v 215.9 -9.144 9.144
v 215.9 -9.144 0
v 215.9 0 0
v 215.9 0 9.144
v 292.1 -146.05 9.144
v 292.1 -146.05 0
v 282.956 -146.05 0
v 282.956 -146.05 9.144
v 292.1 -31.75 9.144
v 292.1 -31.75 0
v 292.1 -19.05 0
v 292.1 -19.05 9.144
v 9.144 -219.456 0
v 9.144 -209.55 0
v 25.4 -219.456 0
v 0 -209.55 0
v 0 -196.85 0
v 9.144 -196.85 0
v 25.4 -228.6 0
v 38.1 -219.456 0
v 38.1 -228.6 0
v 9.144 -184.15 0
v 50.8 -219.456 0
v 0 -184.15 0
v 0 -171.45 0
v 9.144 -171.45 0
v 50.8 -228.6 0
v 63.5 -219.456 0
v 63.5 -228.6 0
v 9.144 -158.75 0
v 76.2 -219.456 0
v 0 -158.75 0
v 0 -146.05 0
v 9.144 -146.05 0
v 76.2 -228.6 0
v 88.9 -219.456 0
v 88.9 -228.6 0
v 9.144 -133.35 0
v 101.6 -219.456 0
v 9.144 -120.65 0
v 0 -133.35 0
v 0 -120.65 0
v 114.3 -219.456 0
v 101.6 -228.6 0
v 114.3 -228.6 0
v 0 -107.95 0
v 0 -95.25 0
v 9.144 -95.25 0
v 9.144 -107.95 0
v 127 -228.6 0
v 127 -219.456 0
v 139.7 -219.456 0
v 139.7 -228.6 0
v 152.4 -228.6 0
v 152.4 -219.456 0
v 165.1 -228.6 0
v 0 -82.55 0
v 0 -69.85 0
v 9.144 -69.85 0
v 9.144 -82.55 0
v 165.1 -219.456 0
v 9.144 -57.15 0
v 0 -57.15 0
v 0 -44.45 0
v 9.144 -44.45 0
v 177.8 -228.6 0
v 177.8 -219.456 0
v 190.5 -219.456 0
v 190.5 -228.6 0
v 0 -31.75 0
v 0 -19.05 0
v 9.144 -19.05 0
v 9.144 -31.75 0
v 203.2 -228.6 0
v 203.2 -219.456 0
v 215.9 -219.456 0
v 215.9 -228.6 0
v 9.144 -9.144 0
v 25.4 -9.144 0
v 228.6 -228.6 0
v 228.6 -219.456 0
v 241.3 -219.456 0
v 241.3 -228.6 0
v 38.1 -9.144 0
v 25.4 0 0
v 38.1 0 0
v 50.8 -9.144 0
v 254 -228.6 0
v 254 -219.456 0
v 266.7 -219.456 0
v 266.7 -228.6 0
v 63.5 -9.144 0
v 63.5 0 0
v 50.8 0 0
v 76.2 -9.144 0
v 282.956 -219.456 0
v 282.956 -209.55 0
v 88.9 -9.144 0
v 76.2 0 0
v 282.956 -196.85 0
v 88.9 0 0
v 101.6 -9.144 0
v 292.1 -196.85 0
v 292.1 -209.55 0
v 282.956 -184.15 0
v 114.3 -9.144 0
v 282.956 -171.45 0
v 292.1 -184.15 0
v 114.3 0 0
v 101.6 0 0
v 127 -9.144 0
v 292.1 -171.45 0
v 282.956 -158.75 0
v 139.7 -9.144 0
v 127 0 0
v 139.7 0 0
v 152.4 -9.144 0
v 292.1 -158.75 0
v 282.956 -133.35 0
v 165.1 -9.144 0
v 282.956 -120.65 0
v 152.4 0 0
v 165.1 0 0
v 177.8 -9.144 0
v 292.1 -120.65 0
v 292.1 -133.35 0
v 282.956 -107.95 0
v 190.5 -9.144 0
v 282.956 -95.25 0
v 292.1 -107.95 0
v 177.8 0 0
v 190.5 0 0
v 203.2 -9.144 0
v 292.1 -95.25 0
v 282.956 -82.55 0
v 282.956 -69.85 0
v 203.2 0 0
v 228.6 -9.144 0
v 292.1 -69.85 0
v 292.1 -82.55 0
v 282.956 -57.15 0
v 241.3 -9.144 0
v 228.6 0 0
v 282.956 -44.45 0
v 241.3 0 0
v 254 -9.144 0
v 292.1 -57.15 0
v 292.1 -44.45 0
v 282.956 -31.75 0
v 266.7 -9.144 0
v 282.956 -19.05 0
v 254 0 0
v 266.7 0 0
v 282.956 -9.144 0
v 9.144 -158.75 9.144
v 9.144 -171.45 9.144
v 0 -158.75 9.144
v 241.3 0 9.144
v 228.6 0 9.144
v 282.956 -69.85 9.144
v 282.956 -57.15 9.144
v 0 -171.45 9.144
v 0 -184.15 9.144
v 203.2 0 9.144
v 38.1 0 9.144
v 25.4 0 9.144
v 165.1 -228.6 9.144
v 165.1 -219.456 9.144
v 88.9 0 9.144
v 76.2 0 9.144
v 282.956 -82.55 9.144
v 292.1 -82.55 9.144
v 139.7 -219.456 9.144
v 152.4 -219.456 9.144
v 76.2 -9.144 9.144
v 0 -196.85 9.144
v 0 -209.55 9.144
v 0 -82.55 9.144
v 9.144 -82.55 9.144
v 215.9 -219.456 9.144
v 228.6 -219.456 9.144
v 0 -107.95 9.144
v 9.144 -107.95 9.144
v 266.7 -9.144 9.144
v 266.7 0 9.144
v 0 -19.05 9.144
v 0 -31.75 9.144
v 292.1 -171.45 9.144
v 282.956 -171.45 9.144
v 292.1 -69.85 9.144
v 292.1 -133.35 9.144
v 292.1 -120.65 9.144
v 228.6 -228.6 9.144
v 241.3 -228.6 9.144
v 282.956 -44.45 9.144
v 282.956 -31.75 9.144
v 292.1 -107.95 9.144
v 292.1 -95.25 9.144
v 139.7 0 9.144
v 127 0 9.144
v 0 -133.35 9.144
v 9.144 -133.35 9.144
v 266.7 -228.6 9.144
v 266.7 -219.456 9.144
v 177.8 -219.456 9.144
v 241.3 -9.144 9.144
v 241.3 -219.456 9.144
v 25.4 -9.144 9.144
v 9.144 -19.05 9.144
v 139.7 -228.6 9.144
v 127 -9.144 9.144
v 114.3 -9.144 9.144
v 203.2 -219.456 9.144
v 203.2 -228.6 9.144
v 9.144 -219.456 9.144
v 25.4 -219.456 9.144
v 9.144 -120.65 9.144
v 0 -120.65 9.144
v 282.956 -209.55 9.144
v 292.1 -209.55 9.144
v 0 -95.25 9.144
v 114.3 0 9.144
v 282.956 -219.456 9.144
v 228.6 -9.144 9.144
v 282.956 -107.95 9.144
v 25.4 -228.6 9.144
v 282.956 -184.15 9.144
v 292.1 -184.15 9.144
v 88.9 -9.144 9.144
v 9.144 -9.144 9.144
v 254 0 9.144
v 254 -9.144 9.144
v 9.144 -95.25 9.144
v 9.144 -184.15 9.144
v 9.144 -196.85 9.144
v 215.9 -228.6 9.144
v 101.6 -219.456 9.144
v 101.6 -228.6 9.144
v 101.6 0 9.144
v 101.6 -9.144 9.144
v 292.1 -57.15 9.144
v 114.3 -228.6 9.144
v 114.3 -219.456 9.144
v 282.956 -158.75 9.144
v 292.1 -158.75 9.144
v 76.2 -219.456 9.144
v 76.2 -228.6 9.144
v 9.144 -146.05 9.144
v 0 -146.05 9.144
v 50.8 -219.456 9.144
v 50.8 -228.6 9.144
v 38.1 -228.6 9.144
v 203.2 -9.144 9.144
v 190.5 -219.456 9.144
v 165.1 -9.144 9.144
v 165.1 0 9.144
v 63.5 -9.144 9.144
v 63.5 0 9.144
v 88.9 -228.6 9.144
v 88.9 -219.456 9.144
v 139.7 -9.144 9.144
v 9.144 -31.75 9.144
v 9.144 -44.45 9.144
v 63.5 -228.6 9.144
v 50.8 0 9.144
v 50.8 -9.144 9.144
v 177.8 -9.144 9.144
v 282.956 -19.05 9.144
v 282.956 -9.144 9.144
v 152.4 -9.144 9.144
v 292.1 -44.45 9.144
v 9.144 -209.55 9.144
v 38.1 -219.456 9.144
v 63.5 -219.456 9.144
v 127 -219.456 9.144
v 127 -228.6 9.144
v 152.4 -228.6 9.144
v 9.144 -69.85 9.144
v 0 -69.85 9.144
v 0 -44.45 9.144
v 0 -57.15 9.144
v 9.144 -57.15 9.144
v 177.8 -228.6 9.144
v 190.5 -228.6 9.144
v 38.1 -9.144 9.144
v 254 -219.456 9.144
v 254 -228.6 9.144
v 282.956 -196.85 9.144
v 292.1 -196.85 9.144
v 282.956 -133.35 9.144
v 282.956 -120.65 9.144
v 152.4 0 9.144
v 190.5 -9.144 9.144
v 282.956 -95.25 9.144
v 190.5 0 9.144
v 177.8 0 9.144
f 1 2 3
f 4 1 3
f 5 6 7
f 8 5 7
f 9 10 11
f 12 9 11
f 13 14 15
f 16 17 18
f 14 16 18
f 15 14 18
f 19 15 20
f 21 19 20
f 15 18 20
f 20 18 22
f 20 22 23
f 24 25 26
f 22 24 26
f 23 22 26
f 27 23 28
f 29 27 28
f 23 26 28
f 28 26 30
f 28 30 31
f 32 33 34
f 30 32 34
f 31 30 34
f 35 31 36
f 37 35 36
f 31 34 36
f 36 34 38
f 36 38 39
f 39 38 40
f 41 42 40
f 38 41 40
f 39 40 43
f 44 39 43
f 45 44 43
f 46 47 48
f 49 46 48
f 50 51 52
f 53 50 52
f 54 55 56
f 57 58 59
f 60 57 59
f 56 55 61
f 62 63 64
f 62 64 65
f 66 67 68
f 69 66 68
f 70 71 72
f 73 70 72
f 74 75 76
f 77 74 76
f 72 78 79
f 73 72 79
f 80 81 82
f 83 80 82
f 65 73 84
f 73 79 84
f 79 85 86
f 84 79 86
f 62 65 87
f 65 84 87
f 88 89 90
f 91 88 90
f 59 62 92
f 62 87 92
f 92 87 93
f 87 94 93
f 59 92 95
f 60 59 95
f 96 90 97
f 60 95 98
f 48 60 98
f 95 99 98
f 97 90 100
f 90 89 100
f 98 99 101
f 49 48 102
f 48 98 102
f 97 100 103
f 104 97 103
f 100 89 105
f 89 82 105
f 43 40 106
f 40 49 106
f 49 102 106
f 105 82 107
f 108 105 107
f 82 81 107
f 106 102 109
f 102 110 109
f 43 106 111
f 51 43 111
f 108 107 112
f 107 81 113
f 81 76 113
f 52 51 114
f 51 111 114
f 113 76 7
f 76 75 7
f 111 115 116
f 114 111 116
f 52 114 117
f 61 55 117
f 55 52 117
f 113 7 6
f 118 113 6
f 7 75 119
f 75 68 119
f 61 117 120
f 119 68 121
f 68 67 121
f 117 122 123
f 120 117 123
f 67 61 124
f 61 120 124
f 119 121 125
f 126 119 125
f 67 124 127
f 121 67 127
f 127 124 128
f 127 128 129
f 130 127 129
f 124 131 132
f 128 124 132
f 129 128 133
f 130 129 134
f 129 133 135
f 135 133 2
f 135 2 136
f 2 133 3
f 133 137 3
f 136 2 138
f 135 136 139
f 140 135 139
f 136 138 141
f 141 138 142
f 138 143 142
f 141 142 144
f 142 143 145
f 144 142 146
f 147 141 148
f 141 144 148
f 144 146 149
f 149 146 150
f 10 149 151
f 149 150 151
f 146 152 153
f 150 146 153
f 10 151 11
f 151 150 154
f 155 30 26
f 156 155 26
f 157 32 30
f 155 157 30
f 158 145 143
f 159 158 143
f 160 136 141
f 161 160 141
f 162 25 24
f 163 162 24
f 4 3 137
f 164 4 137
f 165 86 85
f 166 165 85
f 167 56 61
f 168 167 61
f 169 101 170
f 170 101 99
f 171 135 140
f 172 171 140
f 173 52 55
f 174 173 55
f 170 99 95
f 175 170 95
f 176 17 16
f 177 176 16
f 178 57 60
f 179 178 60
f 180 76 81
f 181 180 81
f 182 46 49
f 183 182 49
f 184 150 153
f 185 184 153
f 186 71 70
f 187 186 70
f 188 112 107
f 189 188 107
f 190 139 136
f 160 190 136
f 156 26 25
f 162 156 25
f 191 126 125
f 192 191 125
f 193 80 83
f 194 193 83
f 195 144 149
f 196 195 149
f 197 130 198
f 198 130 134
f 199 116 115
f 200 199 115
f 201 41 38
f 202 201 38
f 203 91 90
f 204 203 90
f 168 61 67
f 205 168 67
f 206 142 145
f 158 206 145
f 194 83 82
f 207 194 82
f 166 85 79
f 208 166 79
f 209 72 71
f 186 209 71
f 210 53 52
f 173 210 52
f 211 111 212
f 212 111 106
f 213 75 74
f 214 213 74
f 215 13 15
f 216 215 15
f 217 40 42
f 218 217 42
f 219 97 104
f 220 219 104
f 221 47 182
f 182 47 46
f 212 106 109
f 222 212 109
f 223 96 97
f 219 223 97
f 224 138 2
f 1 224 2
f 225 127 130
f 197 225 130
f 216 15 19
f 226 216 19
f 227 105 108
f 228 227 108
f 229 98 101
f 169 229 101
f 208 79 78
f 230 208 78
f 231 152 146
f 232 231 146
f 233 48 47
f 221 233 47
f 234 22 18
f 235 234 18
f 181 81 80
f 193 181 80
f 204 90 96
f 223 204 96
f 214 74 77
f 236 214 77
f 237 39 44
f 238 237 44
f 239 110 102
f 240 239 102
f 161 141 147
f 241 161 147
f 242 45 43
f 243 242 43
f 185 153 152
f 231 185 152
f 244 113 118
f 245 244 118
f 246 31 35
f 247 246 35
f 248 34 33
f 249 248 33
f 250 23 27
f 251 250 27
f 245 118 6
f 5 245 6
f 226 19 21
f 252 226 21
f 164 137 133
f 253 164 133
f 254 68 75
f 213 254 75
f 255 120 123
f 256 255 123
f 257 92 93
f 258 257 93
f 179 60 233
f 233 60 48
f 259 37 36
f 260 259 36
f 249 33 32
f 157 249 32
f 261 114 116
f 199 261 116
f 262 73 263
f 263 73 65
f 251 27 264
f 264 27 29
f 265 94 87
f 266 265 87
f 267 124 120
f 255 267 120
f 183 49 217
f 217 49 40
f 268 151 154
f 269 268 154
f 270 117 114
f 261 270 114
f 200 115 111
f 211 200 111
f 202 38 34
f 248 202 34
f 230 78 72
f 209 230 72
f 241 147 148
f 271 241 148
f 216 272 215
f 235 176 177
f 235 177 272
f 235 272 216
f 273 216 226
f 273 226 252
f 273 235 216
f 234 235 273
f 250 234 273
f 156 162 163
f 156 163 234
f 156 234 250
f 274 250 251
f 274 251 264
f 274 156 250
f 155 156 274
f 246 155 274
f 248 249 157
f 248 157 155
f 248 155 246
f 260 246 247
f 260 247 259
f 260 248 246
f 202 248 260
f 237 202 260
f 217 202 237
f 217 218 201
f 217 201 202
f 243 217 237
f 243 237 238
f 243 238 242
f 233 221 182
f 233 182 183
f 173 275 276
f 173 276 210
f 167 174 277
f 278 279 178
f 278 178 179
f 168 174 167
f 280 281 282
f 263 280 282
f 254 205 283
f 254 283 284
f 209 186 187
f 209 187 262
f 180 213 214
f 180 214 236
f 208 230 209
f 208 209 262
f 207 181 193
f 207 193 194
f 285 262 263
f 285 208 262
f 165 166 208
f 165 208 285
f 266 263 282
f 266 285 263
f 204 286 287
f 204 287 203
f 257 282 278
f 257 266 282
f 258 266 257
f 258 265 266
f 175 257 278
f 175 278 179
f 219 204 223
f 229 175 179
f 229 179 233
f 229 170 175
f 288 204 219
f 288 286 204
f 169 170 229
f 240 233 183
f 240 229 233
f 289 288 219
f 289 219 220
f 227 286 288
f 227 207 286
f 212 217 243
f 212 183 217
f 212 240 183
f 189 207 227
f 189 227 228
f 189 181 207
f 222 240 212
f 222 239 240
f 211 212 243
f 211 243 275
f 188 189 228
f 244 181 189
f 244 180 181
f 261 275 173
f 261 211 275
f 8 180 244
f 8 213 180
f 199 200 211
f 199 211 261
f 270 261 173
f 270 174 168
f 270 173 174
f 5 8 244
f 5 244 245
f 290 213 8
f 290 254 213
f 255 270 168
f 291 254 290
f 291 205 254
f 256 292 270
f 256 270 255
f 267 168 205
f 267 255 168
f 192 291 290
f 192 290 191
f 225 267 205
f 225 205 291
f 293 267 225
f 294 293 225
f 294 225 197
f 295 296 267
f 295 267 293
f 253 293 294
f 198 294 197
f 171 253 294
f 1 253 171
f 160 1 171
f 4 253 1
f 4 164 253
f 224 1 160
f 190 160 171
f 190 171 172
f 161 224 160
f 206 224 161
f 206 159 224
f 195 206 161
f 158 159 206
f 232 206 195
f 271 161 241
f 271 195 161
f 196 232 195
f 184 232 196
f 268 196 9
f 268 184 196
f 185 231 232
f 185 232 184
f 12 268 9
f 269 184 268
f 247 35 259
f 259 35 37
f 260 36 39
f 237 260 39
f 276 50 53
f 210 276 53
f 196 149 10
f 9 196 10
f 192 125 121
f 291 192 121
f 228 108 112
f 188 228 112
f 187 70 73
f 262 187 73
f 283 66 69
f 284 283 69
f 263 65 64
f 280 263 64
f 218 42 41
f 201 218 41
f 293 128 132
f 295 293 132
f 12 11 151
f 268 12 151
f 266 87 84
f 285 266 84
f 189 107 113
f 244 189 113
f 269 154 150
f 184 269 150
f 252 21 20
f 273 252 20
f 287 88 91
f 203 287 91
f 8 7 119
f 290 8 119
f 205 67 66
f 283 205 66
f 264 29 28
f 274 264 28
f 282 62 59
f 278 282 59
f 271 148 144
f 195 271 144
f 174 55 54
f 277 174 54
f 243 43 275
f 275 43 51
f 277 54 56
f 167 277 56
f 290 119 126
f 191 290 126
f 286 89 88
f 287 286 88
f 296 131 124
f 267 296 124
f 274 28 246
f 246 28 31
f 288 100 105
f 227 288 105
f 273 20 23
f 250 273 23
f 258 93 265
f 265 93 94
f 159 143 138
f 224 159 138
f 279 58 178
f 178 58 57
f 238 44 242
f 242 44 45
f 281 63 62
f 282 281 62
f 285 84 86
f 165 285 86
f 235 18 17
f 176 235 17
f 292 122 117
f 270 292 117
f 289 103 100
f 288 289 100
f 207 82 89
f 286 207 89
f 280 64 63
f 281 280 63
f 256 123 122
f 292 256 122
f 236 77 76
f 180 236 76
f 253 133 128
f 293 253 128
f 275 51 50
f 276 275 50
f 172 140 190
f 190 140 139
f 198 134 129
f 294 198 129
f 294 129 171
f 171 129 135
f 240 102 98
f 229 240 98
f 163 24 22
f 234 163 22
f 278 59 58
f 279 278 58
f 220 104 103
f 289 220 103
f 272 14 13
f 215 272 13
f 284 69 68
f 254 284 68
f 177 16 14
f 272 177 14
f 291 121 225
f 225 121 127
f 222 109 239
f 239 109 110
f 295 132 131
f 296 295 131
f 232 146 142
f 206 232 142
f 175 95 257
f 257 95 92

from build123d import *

# Parameters (mm, degrees)
F1_DEPTH = 9.144


with BuildPart() as f1:
    # F0 (on Top) → F1 (new body)
    with BuildSketch(Plane.XY):
        Polygon((38.1, 0), (25.4, 0), (25.4, -9.144), (9.144, -9.144), (9.144, -19.05), (0, -19.05), (0, -31.75), (9.144, -31.75), (9.144, -44.45), (0, -44.45), (0, -57.15), (9.144, -57.15), (9.144, -69.85), (0, -69.85), (0, -82.55), (9.144, -82.55), (9.144, -95.25), (0, -95.25), (0, -107.95), (9.144, -107.95), (9.144, -120.65), (0, -120.65), (0, -133.35), (9.144, -133.35), (9.144, -146.05), (0, -146.05), (0, -158.75), (9.144, -158.75), (9.144, -171.45), (0, -171.45), (0, -184.15), (9.144, -184.15), (9.144, -196.85), (0, -196.85), (0, -209.55), (9.144, -209.55), (9.144, -219.456), (25.4, -219.456), (25.4, -228.6), (38.1, -228.6), (38.1, -219.456), (50.8, -219.456), (50.8, -228.6), (63.5, -228.6), (63.5, -219.456), (76.2, -219.456), (76.2, -228.6), (88.9, -228.6), (88.9, -219.456), (101.6, -219.456), (101.6, -228.6), (114.3, -228.6), (114.3, -219.456), (127, -219.456), (127, -228.6), (139.7, -228.6), (139.7, -219.456), (152.4, -219.456), (152.4, -228.6), (165.1, -228.6), (165.1, -219.456), (177.8, -219.456), (177.8, -228.6), (190.5, -228.6), (190.5, -219.456), (203.2, -219.456), (203.2, -228.6), (215.9, -228.6), (215.9, -219.456), (228.6, -219.456), (228.6, -228.6), (241.3, -228.6), (241.3, -219.456), (254, -219.456), (254, -228.6), (266.7, -228.6), (266.7, -219.456), (282.956, -219.456), (282.956, -209.55), (292.1, -209.55), (292.1, -196.85), (282.956, -196.85), (282.956, -184.15), (292.1, -184.15), (292.1, -171.45), (282.956, -171.45), (282.956, -158.75), (292.1, -158.75), (292.1, -146.05), (282.956, -146.05), (282.956, -133.35), (292.1, -133.35), (292.1, -120.65), (282.956, -120.65), (282.956, -107.95), (292.1, -107.95), (292.1, -95.25), (282.956, -95.25), (282.956, -82.55), (292.1, -82.55), (292.1, -69.85), (282.956, -69.85), (282.956, -57.15), (292.1, -57.15), (292.1, -44.45), (282.956, -44.45), (282.956, -31.75), (292.1, -31.75), (292.1, -19.05), (282.956, -19.05), (282.956, -9.144), (266.7, -9.144), (266.7, 0), (254, 0), (254, -9.144), (241.3, -9.144), (241.3, 0), (228.6, 0), (228.6, -9.144), (215.9, -9.144), (215.9, 0), (203.2, 0), (203.2, -9.144), (190.5, -9.144), (190.5, 0), (177.8, 0), (177.8, -9.144), (165.1, -9.144), (165.1, 0), (152.4, 0), (152.4, -9.144), (139.7, -9.144), (139.7, 0), (127, 0), (127, -9.144), (114.3, -9.144), (114.3, 0), (101.6, 0), (101.6, -9.144), (88.9, -9.144), (88.9, 0), (76.2, 0), (76.2, -9.144), (63.5, -9.144), (63.5, 0), (50.8, 0), (50.8, -9.144), (38.1, -9.144), align=None)
    extrude(amount=F1_DEPTH)


solid = f1.part
